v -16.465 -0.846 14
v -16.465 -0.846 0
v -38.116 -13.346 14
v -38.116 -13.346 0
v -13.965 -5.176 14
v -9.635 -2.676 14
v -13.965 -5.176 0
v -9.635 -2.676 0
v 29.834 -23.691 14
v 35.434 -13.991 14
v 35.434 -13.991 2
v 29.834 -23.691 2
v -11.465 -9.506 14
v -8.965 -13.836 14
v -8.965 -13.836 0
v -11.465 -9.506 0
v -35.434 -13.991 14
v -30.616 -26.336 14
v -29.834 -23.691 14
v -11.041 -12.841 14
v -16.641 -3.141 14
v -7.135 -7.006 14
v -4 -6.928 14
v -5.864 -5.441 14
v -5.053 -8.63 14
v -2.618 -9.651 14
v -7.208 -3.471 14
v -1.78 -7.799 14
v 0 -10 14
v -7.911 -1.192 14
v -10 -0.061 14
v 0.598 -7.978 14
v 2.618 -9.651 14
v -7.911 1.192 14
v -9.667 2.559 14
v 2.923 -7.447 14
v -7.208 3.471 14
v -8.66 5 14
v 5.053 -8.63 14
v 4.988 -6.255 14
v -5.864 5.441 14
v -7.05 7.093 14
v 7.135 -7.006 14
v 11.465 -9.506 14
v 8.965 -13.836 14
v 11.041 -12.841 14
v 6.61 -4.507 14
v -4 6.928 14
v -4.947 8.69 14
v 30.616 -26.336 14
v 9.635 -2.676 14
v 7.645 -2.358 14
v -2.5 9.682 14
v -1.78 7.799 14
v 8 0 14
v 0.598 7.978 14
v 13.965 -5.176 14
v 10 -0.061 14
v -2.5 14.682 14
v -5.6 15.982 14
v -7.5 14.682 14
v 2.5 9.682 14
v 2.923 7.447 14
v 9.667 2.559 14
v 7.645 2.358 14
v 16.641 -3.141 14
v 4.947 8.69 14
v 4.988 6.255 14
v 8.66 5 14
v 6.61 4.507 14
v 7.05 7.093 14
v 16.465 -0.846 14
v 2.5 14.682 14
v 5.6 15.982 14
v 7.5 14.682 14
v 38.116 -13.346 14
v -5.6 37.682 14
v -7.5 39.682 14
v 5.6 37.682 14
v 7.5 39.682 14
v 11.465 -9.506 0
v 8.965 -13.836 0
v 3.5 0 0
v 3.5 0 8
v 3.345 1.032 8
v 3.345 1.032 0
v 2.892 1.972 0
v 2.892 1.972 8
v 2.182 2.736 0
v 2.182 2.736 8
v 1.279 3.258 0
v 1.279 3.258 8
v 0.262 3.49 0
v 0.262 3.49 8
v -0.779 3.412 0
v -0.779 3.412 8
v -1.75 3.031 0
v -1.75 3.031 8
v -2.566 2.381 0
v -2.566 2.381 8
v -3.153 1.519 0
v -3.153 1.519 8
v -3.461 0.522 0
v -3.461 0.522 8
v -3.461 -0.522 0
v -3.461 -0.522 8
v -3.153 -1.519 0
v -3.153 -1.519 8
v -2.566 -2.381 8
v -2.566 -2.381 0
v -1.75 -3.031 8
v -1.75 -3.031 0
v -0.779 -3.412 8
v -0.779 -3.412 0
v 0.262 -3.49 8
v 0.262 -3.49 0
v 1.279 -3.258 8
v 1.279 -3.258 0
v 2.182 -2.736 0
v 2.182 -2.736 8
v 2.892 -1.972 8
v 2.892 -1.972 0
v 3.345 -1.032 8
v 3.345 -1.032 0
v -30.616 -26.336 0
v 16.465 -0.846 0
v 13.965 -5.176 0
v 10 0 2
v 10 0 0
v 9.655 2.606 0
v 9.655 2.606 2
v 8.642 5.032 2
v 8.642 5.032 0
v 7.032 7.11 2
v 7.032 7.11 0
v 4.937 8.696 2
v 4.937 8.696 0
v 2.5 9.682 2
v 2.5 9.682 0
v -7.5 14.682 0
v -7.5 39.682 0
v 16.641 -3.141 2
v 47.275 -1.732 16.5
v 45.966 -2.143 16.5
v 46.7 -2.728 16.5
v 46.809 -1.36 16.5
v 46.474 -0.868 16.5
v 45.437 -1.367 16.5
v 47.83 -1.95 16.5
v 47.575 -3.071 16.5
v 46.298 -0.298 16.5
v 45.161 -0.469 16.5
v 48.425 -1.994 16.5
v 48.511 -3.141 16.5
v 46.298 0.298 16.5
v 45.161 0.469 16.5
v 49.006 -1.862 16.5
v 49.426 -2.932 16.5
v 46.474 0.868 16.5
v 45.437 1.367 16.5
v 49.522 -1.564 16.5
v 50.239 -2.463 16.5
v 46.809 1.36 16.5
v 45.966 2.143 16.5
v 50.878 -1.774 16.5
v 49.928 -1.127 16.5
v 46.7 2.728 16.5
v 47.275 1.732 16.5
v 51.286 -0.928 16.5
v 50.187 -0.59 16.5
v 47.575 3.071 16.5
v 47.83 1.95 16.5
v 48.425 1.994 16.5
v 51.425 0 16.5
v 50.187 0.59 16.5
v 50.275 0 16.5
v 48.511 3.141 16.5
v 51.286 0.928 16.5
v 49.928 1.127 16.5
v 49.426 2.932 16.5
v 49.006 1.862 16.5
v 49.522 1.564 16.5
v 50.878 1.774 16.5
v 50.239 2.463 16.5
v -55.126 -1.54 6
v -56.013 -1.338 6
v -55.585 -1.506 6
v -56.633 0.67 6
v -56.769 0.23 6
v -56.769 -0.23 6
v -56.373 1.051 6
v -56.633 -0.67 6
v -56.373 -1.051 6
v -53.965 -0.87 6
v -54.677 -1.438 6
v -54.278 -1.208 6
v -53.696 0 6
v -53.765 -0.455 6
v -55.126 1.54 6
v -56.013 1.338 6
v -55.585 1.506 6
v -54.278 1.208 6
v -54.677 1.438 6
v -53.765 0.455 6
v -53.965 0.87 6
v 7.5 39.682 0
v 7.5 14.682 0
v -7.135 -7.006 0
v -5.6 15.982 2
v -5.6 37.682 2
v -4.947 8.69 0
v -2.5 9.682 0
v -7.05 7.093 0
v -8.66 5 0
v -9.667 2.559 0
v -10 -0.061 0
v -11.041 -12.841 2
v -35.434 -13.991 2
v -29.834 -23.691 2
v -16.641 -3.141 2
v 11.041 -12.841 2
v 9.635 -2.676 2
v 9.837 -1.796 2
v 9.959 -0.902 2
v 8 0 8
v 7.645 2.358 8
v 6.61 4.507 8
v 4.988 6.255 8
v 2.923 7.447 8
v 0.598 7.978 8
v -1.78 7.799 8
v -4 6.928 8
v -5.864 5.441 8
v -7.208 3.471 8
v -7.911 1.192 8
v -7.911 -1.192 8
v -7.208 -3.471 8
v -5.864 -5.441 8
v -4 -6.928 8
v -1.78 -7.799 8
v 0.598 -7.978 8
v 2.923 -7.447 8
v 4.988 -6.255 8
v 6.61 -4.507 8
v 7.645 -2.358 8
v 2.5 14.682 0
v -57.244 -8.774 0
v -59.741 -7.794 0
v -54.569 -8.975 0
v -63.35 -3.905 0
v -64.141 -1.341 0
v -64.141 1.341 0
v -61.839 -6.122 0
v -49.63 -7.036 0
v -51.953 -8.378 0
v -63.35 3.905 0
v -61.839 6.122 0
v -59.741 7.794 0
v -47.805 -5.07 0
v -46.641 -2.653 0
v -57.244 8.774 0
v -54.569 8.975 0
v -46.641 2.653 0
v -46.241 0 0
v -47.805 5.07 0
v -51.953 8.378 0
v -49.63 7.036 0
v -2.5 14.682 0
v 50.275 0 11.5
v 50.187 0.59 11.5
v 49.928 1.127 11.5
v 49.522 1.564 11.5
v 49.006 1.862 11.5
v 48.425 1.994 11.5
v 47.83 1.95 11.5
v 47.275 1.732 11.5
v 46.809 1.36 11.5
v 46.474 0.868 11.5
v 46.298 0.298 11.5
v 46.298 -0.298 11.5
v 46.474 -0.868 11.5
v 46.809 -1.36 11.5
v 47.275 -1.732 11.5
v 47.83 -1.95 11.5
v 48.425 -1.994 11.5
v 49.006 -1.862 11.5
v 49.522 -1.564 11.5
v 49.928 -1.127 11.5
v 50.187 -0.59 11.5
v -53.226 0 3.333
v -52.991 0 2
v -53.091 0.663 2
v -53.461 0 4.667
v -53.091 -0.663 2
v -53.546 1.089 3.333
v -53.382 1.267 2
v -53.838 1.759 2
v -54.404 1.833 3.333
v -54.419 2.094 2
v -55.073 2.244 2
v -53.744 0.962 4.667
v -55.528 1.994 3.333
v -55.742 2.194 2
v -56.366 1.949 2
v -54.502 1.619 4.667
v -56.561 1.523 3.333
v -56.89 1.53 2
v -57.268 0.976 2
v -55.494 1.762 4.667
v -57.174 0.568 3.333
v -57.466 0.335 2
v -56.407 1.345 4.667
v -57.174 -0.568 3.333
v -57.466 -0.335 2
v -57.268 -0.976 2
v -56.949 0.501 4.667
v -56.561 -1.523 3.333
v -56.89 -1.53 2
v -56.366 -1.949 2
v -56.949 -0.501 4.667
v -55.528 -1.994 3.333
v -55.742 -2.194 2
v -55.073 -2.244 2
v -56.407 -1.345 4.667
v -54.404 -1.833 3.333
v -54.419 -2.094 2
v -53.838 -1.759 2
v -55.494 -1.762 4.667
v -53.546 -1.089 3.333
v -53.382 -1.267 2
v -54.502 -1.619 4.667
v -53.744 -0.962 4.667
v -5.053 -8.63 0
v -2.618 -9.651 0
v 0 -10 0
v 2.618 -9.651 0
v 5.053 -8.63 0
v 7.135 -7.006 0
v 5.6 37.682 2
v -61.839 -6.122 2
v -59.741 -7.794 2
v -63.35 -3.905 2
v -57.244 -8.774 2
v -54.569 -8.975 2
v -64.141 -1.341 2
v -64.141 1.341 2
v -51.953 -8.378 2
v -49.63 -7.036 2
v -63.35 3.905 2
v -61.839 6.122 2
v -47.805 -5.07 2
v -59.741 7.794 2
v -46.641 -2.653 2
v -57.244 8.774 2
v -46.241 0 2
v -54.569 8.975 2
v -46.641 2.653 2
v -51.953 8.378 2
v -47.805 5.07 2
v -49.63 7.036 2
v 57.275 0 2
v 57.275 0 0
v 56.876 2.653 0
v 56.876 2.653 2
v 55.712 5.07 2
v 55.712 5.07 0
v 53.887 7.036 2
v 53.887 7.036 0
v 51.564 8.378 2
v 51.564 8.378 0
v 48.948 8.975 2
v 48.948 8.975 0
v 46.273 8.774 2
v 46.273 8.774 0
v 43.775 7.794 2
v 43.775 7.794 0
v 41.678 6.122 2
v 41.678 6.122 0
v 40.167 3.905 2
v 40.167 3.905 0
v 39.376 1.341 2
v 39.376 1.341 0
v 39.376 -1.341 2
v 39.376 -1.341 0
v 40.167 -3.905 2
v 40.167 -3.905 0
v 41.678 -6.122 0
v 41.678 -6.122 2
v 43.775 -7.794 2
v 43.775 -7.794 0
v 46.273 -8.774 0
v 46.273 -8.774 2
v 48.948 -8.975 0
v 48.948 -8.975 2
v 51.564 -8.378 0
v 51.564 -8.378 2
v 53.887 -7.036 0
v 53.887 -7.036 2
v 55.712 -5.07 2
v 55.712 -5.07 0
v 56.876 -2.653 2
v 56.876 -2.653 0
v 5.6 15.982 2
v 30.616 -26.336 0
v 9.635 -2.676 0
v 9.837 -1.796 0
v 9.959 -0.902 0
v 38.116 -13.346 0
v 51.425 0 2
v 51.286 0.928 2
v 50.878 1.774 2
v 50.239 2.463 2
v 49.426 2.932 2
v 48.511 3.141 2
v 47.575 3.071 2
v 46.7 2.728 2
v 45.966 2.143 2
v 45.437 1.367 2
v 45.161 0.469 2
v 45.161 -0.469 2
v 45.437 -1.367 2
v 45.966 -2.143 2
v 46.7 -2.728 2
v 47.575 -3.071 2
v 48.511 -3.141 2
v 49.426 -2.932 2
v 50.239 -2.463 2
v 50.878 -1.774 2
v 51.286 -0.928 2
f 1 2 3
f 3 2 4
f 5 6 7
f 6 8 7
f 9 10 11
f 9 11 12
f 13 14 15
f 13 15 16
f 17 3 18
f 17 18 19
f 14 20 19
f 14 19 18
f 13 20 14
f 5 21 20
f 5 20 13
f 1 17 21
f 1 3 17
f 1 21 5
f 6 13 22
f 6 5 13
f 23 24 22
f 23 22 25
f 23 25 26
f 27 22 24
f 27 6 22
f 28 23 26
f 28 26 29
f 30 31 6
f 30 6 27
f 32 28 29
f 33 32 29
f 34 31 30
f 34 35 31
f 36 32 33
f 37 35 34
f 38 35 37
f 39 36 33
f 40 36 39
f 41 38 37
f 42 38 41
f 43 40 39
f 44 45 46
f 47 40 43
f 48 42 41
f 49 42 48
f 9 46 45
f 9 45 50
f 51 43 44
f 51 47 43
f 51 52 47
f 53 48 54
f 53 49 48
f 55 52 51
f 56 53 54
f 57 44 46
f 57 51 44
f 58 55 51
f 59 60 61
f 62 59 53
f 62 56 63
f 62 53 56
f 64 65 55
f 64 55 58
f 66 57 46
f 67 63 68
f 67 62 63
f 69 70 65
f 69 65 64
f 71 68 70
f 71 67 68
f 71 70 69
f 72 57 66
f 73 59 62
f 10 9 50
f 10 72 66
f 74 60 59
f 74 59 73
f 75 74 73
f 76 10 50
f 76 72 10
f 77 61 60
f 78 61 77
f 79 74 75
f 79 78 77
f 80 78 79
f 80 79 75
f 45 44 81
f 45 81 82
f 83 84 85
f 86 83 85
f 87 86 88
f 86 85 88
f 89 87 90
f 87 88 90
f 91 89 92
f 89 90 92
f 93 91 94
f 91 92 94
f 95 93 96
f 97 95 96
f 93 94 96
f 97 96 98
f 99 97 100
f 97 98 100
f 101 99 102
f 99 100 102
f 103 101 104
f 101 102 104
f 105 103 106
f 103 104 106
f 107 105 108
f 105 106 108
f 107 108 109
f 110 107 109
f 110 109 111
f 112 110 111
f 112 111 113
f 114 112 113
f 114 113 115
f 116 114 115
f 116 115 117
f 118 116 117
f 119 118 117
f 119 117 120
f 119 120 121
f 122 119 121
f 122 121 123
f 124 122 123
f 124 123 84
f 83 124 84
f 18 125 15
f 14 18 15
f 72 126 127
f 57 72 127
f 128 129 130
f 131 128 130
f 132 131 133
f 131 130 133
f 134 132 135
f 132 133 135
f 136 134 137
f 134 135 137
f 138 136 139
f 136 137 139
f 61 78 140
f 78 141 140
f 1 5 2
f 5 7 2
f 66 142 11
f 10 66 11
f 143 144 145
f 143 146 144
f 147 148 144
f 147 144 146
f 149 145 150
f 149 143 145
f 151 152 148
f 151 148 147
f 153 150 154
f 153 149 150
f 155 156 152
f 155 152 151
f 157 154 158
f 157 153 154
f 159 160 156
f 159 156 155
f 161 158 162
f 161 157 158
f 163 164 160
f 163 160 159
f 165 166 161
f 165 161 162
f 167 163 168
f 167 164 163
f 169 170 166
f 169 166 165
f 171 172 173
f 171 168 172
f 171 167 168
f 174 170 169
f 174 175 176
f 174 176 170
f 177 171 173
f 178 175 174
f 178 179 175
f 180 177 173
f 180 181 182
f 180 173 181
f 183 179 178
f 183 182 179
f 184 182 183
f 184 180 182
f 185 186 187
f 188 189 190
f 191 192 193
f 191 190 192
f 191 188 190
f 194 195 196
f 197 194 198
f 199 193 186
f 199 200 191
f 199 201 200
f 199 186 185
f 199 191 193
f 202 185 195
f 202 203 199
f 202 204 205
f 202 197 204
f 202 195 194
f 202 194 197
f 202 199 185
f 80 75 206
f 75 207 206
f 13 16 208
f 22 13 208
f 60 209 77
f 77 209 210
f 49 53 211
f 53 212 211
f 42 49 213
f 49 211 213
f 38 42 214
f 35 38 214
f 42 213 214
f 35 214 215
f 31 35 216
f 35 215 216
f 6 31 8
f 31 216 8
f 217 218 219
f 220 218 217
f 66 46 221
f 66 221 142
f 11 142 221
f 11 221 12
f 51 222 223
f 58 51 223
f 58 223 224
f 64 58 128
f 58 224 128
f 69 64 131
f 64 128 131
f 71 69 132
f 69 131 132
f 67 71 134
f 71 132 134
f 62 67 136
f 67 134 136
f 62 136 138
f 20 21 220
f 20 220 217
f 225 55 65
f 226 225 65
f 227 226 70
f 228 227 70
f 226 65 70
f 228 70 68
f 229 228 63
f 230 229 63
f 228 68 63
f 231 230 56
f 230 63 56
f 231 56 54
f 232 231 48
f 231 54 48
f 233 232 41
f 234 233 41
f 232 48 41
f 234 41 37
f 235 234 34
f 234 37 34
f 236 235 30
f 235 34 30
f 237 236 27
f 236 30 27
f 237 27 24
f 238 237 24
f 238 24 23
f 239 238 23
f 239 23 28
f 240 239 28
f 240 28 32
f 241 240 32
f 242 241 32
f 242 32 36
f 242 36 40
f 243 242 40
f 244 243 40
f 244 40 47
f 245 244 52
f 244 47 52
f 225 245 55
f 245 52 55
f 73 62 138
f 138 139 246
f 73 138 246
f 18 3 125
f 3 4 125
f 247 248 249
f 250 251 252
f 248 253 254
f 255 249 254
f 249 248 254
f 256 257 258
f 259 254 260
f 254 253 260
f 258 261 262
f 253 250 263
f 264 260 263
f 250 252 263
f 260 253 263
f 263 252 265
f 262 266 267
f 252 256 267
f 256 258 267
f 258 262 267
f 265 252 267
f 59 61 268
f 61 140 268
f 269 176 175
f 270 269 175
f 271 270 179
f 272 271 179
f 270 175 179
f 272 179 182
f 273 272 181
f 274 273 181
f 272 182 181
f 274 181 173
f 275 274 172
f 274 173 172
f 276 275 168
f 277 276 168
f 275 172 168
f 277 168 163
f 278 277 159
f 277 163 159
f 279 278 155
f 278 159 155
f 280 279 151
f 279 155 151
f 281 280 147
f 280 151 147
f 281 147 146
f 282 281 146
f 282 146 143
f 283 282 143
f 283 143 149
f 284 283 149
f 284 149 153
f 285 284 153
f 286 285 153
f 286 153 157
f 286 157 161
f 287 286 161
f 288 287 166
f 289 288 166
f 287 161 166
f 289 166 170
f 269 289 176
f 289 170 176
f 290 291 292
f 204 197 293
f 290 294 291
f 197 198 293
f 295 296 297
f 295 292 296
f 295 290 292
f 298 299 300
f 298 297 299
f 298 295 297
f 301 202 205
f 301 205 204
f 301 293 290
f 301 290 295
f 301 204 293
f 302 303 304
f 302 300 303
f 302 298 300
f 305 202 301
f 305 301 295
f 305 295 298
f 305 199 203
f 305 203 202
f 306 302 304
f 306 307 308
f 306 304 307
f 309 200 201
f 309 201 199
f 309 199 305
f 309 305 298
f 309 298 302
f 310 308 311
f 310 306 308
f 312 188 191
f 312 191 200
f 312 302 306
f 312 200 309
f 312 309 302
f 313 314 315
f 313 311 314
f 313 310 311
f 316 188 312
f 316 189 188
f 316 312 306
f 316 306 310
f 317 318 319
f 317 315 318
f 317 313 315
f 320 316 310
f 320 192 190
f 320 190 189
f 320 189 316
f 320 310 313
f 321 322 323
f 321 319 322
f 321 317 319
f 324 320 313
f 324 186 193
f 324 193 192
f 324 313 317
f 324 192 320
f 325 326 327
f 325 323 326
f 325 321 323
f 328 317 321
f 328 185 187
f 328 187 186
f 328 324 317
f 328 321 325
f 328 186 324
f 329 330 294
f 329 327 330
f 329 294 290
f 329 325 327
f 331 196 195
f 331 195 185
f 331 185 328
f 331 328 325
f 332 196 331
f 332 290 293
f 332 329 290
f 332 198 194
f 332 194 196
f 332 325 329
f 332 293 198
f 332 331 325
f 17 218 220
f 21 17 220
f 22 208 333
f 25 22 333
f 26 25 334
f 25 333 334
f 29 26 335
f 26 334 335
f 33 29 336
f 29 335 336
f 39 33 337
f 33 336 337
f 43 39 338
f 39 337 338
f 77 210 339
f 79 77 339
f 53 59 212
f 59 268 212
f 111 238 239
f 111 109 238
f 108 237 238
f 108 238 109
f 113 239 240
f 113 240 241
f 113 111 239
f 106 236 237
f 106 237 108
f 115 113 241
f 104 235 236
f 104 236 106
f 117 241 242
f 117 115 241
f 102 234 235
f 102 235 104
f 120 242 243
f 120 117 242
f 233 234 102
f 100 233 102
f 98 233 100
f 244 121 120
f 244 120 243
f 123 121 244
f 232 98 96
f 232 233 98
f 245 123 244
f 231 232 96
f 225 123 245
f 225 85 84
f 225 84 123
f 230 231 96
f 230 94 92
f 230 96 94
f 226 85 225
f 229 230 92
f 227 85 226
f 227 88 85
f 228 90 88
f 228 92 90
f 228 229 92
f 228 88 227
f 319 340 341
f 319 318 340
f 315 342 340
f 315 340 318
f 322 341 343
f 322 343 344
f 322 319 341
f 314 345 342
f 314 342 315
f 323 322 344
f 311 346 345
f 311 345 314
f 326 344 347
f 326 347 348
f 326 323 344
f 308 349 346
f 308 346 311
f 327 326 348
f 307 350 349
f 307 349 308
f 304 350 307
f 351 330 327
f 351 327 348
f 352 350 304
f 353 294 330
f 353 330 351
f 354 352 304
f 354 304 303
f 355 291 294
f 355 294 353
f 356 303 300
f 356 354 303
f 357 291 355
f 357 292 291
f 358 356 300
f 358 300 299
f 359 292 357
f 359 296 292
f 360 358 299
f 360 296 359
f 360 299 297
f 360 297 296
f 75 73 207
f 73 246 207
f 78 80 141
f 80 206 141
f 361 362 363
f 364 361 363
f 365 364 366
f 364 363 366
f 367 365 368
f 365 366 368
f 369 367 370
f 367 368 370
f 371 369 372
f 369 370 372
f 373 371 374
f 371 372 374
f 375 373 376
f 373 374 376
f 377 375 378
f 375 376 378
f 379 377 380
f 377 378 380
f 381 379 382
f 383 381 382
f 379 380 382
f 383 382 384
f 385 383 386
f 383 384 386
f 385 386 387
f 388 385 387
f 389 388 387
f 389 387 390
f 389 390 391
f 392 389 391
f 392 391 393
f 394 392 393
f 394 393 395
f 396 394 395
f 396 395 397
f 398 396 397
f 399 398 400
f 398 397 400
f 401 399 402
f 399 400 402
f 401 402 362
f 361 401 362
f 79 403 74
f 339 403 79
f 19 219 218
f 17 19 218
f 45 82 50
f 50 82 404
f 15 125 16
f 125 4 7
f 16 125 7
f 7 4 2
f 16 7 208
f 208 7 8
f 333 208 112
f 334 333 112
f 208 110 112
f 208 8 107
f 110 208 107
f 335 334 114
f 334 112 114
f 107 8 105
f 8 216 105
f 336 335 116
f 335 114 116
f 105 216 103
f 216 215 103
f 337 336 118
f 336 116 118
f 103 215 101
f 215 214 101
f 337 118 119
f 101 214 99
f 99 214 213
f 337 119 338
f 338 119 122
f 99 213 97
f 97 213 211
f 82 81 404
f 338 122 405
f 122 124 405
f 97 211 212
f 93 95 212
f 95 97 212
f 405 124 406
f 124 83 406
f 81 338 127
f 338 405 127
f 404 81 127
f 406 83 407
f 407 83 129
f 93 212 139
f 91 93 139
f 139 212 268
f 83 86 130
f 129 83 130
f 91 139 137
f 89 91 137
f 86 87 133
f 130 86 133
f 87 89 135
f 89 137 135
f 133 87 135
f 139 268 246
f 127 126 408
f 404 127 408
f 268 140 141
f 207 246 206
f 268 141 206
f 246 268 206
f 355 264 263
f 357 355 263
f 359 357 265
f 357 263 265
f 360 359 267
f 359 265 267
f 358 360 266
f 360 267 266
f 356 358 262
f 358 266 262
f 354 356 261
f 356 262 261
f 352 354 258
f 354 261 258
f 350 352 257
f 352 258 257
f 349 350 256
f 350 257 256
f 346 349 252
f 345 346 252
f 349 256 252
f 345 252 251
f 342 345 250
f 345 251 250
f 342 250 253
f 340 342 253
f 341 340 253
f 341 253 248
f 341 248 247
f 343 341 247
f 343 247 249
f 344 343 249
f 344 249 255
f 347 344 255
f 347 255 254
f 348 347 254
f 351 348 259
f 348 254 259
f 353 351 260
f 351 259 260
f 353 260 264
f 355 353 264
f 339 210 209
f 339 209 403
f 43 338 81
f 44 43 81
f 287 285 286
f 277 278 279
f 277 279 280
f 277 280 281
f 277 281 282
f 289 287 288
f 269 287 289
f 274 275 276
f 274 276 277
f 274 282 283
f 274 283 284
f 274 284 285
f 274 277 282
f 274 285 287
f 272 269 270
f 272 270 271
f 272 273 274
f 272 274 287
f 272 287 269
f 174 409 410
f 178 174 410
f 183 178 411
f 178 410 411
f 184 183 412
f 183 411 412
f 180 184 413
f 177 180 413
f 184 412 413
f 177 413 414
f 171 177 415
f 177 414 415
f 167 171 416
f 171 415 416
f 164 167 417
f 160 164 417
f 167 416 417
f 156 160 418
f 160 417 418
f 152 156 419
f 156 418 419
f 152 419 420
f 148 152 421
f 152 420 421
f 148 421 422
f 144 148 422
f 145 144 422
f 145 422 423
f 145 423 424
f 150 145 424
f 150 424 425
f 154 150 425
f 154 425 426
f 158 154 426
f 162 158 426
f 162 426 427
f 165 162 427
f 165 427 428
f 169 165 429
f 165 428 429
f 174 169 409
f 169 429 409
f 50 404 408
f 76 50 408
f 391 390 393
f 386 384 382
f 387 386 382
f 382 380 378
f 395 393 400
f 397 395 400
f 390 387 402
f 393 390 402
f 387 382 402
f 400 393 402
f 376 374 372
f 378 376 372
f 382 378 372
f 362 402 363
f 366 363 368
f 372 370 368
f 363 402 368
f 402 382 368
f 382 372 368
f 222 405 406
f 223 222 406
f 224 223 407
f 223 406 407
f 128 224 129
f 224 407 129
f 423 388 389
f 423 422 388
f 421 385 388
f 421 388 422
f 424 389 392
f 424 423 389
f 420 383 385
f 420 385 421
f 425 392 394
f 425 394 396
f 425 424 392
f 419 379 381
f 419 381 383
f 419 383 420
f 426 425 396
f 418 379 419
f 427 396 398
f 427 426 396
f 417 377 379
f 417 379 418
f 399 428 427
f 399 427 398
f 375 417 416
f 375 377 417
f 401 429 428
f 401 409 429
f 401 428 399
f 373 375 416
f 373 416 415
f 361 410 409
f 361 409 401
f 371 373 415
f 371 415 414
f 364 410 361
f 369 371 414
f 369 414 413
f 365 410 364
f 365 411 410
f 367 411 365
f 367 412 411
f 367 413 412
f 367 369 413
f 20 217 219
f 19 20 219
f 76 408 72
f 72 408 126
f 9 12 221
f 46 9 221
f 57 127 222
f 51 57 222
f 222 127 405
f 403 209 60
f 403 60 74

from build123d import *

# Parameters (mm, degrees)
F1_DEPTH  = 2
F2_W      = 11.2
F2_H      = 21.7
F3_DEPTH  = 12
F4_R      = 3.5
F5_DEPTH  = 25
F6_R      = 8
F7_DEPTH  = 6
F8_R      = 9
F9_DEPTH  = 2
F10_R     = 3.15
F11_DEPTH = 14.5
F12_R     = 2
F13_DEPTH = 5
F14_R     = 9
F15_DEPTH = 2
F16_R     = 2.25
F17_DEPTH = 4
F17_TAPER = 10


with BuildPart() as f1:
    # F0 (on Top) → F1 (new body)
    with BuildSketch(Plane.XY):
        with BuildLine():
            ThreePointArc((9.6352549156, -2.6761656733), (9.9083941473, -1.3504537837), (10, 0))
            ThreePointArc((10, 0), (7.9056941504, 6.123724357), (2.5, 9.6824583655))
            ThreePointArc((2.5, 9.6824583655), (0, 10), (-2.5, 9.6824583655))
            ThreePointArc((-2.5, 9.6824583655), (-8.6602540378, 5), (-9.6352549156, -2.6761656733))
            ThreePointArc((-9.6352549156, -2.6761656733), (-8.6602540378, -5), (-7.1352549156, -7.0062926922))
            ThreePointArc((-7.1352549156, -7.0062926922), (0, -10), (7.1352549156, -7.0062926922))
            ThreePointArc((7.1352549156, -7.0062926922), (8.6602540378, -5), (9.6352549156, -2.6761656733))
        make_face()
        with BuildLine():
            ThreePointArc((-2.5, 9.6824583655), (0, 10), (2.5, 9.6824583655))
            Line((2.5, 9.6824583655), (2.5, 14.6824583655))
            Line((2.5, 14.6824583655), (-2.5, 14.6824583655))
            Line((-2.5, 14.6824583655), (-2.5, 9.6824583655))
        make_face()
        with BuildLine():
            Line((13.9653819345, -5.1761656733), (9.6352549156, -2.6761656733))
            ThreePointArc((9.6352549156, -2.6761656733), (8.6602540378, -5), (7.1352549156, -7.0062926922))
            Line((7.1352549156, -7.0062926922), (11.4653819345, -9.5062926922))
            Line((11.4653819345, -9.5062926922), (13.9653819345, -5.1761656733))
        make_face()
        Polygon((-2.5, 14.6824583655), (2.5, 14.6824583655), (7.5, 14.6824583655), (7.5, 39.6824583655), (-7.5, 39.6824583655), (-7.5, 14.6824583655), align=None)
        Polygon((16.4653819345, -0.8460386544), (13.9653819345, -5.1761656733), (11.4653819345, -9.5062926922), (8.9653819345, -13.8364197111), (30.6160170292, -26.3364197111), (38.1160170292, -13.3460386544), align=None)
        with BuildLine():
            ThreePointArc((-7.1352549156, -7.0062926922), (-8.6602540378, -5), (-9.6352549156, -2.6761656733))
            Line((-9.6352549156, -2.6761656733), (-13.9653819345, -5.1761656733))
            Line((-13.9653819345, -5.1761656733), (-11.4653819345, -9.5062926922))
            Line((-11.4653819345, -9.5062926922), (-7.1352549156, -7.0062926922))
        make_face()
        Polygon((-11.4653819345, -9.5062926922), (-13.9653819345, -5.1761656733), (-16.4653819345, -0.8460386544), (-38.1160170292, -13.3460386544), (-30.6160170292, -26.3364197111), (-8.9653819345, -13.8364197111), align=None)
    extrude(amount=F1_DEPTH)

    # F2 (on face) → F3 (join)
    with BuildSketch(Plane.XY.offset(2)):
        with BuildLine():
            ThreePointArc((9.6352549156, -2.6761656733), (8.6602540378, 5), (2.5, 9.6824583655))
            Line((2.5, 9.6824583655), (2.5, 14.6824583655))
            Line((2.5, 14.6824583655), (7.5, 14.6824583655))
            Line((7.5, 14.6824583655), (7.5, 39.6824583655))
            Line((7.5, 39.6824583655), (-7.5, 39.6824583655))
            Line((-7.5, 39.6824583655), (-7.5, 14.6824583655))
            Line((-7.5, 14.6824583655), (-2.5, 14.6824583655))
            Line((-2.5, 14.6824583655), (-2.5, 9.6824583655))
            ThreePointArc((-2.5, 9.6824583655), (-8.6602540378, 5), (-9.6352549156, -2.6761656733))
            Line((-9.6352549156, -2.6761656733), (-13.9653819345, -5.1761656733))
            Line((-13.9653819345, -5.1761656733), (-16.4653819345, -0.8460386544))
            Line((-16.4653819345, -0.8460386544), (-38.1160170292, -13.3460386544))
            Line((-38.1160170292, -13.3460386544), (-30.6160170292, -26.3364197111))
            Line((-30.6160170292, -26.3364197111), (-8.9653819345, -13.8364197111))
            Line((-8.9653819345, -13.8364197111), (-11.4653819345, -9.5062926922))
            Line((-11.4653819345, -9.5062926922), (-7.1352549156, -7.0062926922))
            ThreePointArc((-7.1352549156, -7.0062926922), (0, -10), (7.1352549156, -7.0062926922))
            Line((7.1352549156, -7.0062926922), (11.4653819345, -9.5062926922))
            Line((11.4653819345, -9.5062926922), (8.9653819345, -13.8364197111))
            Line((8.9653819345, -13.8364197111), (30.6160170292, -26.3364197111))
            Line((30.6160170292, -26.3364197111), (38.1160170292, -13.3460386544))
            Line((38.1160170292, -13.3460386544), (16.4653819345, -0.8460386544))
            Line((16.4653819345, -0.8460386544), (13.9653819345, -5.1761656733))
            Line((13.9653819345, -5.1761656733), (9.6352549156, -2.6761656733))
        make_face()
        Polygon((-29.8339662216, -23.690971444), (-35.4339662216, -13.9914869216), (-16.6412149595, -3.1414869216), (-11.0412149595, -12.840971444), align=None, mode=Mode.SUBTRACT)
        Polygon((35.4339662216, -13.9914869216), (29.8339662216, -23.690971444), (11.0412149595, -12.840971444), (16.6412149595, -3.1414869216), align=None, mode=Mode.SUBTRACT)
        with Locations((0, 26.8324583655)):
            Rectangle(F2_W, F2_H, mode=Mode.SUBTRACT)
    extrude(amount=F3_DEPTH)

    # F4 (on face) → F5 (cut)
    with BuildSketch(Plane.XY.offset(14)):
        Circle(F4_R)
    extrude(amount=-F5_DEPTH, mode=Mode.SUBTRACT)

    # F6 (on face) → F7 (cut)
    with BuildSketch(Plane.XY.offset(14)):
        Circle(F6_R)
    extrude(amount=-F7_DEPTH, mode=Mode.SUBTRACT)


with BuildPart() as f9:
    # F8 (on Top) → F9 (new body)
    with BuildSketch(Plane.XY):
        with Locations((48.2754893601, 0)):
            Circle(F8_R)
    extrude(amount=F9_DEPTH)

    # F10 (on face) → F11 (join)
    with BuildSketch(Plane.XY.offset(2)):
        with Locations((48.2754893601, 0)):
            Circle(F10_R)
    extrude(amount=F11_DEPTH)

    # F12 (on face) → F13 (cut)
    with BuildSketch(Plane.XY.offset(16.5)):
        with Locations((48.2754893601, 0)):
            Circle(F12_R)
    extrude(amount=-F13_DEPTH, mode=Mode.SUBTRACT)


with BuildPart() as f15:
    # F14 (on Top) → F15 (new body)
    with BuildSketch(Plane.XY):
        with Locations((-55.2410967648, 0)):
            Circle(F14_R)
    extrude(amount=F15_DEPTH)

    # F16 (on face) → F17 (join)
    with BuildSketch(Plane.XY.offset(2)):
        with Locations((-55.2410967648, 0)):
            Circle(F16_R)
    extrude(amount=F17_DEPTH, taper=F17_TAPER)


solid = Compound([f1.part, f9.part, f15.part])
